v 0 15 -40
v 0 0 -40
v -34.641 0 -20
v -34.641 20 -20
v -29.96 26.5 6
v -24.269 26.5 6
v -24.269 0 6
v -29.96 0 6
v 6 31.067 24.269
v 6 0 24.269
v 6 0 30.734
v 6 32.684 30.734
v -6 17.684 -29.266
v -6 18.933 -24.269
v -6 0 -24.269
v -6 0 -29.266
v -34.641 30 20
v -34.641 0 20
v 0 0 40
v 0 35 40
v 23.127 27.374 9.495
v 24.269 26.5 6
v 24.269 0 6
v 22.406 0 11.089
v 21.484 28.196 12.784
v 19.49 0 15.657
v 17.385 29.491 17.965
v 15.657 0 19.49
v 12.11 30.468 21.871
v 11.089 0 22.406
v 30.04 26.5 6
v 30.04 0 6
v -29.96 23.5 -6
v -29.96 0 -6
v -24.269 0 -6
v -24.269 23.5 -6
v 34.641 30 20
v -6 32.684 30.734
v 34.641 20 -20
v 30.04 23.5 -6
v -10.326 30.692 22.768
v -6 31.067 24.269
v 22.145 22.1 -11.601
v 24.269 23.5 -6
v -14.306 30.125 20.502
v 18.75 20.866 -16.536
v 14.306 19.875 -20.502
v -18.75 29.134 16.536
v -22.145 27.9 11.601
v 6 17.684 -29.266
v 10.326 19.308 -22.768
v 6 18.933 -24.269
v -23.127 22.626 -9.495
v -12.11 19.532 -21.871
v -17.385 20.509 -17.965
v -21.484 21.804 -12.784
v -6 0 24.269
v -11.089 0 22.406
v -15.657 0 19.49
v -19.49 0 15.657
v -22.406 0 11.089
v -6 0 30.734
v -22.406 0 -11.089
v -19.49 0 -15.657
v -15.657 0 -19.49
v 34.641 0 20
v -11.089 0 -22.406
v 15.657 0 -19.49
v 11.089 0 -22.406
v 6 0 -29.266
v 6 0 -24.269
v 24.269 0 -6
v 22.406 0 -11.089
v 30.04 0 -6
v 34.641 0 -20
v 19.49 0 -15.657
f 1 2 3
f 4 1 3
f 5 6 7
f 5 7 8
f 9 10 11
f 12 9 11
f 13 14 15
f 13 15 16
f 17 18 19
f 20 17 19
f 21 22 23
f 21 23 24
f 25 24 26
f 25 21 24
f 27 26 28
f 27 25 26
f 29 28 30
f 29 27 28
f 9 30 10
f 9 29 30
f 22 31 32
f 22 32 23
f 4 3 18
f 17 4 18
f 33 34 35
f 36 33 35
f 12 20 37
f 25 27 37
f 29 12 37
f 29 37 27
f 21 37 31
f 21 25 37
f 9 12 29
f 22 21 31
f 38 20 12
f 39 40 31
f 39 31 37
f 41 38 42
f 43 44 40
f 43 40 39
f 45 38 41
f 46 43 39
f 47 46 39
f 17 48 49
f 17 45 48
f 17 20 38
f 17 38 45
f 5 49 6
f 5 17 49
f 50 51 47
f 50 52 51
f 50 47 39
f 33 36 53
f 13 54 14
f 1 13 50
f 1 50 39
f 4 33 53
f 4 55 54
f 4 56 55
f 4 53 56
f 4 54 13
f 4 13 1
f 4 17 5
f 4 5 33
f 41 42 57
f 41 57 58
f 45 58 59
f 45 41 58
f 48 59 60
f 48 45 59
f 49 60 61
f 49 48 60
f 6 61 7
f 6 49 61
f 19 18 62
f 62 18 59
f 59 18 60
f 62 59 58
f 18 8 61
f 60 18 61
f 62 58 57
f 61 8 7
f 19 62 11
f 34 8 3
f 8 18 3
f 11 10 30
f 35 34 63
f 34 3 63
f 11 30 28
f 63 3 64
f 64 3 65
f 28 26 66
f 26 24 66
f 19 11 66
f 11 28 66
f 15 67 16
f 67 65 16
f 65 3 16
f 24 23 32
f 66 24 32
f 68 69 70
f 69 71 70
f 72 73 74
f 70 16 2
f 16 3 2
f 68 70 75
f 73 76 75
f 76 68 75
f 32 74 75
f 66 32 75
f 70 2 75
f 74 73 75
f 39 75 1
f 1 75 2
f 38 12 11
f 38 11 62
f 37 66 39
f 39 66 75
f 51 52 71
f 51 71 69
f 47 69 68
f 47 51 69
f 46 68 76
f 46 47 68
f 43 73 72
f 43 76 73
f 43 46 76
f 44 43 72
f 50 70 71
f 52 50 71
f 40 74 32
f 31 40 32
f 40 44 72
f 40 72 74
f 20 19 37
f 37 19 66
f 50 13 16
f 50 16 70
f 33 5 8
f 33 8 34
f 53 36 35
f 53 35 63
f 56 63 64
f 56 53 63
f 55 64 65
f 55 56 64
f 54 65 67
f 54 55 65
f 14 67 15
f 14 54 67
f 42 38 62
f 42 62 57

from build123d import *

# Parameters (mm, degrees)
BOSS_EXTRUDE2_DEPTH      = 35
CUT_EXTRUDE8_DEPTH       = 1
CUT_EXTRUDE8_DEPTH_BACK  = 36
CUT_EXTRUDE10_DEPTH      = 1
CUT_EXTRUDE10_DEPTH_BACK = 70.282032303


with BuildPart() as part:
    # Sketch1 → Boss-Extrude2 (new body)
    with BuildSketch(Plane(origin=(0, 0, 0), x_dir=(1, 0, 0), z_dir=(0, 1, 0))):
        Polygon((0, 40), (-34.641016151, 20), (-34.641016151, -20), (0, -40), (34.641016151, -20), (34.641016151, 20), align=None)
    extrude(amount=BOSS_EXTRUDE2_DEPTH)

    # Sketch8 → Cut-Extrude8 (cut, two sides)
    with BuildSketch(Plane(origin=(0, 35, 0), x_dir=(1, 0, 0), z_dir=(0, 1, 0))) as cut_extrude8_sk:
        with BuildLine():
            Line((-6, 29.265974935), (6, 29.265974935))
            Line((6, 29.265974935), (6, 24.269322199))
            ThreePointArc((6, 24.269322199), (17.67766953, 17.67766953), (24.269322199, 6))
            Line((24.269322199, 6), (30.040393537, 6))
            Line((30.040393537, 6), (30.040393537, -6))
            Line((30.040393537, -6), (24.269322199, -6))
            ThreePointArc((24.269322199, -6), (17.67766953, -17.67766953), (6, -24.269322199))
            Line((6, -24.269322199), (6, -30.734025065))
            Line((6, -30.734025065), (-6, -30.734025065))
            Line((-6, -30.734025065), (-6, -24.269322199))
            ThreePointArc((-6, -24.269322199), (-17.67766953, -17.67766953), (-24.269322199, -6))
            Line((-24.269322199, -6), (-29.959606463, -6))
            Line((-29.959606463, -6), (-29.959606463, 6))
            Line((-29.959606463, 6), (-24.269322199, 6))
            ThreePointArc((-24.269322199, 6), (-17.67766953, 17.67766953), (-6, 24.269322199))
            Line((-6, 24.269322199), (-6, 29.265974935))
        make_face()
    extrude(amount=CUT_EXTRUDE8_DEPTH, mode=Mode.SUBTRACT)
    extrude(cut_extrude8_sk.sketch, amount=-CUT_EXTRUDE8_DEPTH_BACK, mode=Mode.SUBTRACT)

    # Sketch9 → Cut-Extrude10 (cut, two sides)
    with BuildSketch(Plane.ZY.offset(34.641016151)) as cut_extrude10_sk:
        Polygon((40, 35), (-40, 15), (-40, 35), (-20, 35), (20, 35), align=None)
    extrude(amount=CUT_EXTRUDE10_DEPTH, mode=Mode.SUBTRACT)
    extrude(cut_extrude10_sk.sketch, amount=-CUT_EXTRUDE10_DEPTH_BACK, mode=Mode.SUBTRACT)


solid = part.part
